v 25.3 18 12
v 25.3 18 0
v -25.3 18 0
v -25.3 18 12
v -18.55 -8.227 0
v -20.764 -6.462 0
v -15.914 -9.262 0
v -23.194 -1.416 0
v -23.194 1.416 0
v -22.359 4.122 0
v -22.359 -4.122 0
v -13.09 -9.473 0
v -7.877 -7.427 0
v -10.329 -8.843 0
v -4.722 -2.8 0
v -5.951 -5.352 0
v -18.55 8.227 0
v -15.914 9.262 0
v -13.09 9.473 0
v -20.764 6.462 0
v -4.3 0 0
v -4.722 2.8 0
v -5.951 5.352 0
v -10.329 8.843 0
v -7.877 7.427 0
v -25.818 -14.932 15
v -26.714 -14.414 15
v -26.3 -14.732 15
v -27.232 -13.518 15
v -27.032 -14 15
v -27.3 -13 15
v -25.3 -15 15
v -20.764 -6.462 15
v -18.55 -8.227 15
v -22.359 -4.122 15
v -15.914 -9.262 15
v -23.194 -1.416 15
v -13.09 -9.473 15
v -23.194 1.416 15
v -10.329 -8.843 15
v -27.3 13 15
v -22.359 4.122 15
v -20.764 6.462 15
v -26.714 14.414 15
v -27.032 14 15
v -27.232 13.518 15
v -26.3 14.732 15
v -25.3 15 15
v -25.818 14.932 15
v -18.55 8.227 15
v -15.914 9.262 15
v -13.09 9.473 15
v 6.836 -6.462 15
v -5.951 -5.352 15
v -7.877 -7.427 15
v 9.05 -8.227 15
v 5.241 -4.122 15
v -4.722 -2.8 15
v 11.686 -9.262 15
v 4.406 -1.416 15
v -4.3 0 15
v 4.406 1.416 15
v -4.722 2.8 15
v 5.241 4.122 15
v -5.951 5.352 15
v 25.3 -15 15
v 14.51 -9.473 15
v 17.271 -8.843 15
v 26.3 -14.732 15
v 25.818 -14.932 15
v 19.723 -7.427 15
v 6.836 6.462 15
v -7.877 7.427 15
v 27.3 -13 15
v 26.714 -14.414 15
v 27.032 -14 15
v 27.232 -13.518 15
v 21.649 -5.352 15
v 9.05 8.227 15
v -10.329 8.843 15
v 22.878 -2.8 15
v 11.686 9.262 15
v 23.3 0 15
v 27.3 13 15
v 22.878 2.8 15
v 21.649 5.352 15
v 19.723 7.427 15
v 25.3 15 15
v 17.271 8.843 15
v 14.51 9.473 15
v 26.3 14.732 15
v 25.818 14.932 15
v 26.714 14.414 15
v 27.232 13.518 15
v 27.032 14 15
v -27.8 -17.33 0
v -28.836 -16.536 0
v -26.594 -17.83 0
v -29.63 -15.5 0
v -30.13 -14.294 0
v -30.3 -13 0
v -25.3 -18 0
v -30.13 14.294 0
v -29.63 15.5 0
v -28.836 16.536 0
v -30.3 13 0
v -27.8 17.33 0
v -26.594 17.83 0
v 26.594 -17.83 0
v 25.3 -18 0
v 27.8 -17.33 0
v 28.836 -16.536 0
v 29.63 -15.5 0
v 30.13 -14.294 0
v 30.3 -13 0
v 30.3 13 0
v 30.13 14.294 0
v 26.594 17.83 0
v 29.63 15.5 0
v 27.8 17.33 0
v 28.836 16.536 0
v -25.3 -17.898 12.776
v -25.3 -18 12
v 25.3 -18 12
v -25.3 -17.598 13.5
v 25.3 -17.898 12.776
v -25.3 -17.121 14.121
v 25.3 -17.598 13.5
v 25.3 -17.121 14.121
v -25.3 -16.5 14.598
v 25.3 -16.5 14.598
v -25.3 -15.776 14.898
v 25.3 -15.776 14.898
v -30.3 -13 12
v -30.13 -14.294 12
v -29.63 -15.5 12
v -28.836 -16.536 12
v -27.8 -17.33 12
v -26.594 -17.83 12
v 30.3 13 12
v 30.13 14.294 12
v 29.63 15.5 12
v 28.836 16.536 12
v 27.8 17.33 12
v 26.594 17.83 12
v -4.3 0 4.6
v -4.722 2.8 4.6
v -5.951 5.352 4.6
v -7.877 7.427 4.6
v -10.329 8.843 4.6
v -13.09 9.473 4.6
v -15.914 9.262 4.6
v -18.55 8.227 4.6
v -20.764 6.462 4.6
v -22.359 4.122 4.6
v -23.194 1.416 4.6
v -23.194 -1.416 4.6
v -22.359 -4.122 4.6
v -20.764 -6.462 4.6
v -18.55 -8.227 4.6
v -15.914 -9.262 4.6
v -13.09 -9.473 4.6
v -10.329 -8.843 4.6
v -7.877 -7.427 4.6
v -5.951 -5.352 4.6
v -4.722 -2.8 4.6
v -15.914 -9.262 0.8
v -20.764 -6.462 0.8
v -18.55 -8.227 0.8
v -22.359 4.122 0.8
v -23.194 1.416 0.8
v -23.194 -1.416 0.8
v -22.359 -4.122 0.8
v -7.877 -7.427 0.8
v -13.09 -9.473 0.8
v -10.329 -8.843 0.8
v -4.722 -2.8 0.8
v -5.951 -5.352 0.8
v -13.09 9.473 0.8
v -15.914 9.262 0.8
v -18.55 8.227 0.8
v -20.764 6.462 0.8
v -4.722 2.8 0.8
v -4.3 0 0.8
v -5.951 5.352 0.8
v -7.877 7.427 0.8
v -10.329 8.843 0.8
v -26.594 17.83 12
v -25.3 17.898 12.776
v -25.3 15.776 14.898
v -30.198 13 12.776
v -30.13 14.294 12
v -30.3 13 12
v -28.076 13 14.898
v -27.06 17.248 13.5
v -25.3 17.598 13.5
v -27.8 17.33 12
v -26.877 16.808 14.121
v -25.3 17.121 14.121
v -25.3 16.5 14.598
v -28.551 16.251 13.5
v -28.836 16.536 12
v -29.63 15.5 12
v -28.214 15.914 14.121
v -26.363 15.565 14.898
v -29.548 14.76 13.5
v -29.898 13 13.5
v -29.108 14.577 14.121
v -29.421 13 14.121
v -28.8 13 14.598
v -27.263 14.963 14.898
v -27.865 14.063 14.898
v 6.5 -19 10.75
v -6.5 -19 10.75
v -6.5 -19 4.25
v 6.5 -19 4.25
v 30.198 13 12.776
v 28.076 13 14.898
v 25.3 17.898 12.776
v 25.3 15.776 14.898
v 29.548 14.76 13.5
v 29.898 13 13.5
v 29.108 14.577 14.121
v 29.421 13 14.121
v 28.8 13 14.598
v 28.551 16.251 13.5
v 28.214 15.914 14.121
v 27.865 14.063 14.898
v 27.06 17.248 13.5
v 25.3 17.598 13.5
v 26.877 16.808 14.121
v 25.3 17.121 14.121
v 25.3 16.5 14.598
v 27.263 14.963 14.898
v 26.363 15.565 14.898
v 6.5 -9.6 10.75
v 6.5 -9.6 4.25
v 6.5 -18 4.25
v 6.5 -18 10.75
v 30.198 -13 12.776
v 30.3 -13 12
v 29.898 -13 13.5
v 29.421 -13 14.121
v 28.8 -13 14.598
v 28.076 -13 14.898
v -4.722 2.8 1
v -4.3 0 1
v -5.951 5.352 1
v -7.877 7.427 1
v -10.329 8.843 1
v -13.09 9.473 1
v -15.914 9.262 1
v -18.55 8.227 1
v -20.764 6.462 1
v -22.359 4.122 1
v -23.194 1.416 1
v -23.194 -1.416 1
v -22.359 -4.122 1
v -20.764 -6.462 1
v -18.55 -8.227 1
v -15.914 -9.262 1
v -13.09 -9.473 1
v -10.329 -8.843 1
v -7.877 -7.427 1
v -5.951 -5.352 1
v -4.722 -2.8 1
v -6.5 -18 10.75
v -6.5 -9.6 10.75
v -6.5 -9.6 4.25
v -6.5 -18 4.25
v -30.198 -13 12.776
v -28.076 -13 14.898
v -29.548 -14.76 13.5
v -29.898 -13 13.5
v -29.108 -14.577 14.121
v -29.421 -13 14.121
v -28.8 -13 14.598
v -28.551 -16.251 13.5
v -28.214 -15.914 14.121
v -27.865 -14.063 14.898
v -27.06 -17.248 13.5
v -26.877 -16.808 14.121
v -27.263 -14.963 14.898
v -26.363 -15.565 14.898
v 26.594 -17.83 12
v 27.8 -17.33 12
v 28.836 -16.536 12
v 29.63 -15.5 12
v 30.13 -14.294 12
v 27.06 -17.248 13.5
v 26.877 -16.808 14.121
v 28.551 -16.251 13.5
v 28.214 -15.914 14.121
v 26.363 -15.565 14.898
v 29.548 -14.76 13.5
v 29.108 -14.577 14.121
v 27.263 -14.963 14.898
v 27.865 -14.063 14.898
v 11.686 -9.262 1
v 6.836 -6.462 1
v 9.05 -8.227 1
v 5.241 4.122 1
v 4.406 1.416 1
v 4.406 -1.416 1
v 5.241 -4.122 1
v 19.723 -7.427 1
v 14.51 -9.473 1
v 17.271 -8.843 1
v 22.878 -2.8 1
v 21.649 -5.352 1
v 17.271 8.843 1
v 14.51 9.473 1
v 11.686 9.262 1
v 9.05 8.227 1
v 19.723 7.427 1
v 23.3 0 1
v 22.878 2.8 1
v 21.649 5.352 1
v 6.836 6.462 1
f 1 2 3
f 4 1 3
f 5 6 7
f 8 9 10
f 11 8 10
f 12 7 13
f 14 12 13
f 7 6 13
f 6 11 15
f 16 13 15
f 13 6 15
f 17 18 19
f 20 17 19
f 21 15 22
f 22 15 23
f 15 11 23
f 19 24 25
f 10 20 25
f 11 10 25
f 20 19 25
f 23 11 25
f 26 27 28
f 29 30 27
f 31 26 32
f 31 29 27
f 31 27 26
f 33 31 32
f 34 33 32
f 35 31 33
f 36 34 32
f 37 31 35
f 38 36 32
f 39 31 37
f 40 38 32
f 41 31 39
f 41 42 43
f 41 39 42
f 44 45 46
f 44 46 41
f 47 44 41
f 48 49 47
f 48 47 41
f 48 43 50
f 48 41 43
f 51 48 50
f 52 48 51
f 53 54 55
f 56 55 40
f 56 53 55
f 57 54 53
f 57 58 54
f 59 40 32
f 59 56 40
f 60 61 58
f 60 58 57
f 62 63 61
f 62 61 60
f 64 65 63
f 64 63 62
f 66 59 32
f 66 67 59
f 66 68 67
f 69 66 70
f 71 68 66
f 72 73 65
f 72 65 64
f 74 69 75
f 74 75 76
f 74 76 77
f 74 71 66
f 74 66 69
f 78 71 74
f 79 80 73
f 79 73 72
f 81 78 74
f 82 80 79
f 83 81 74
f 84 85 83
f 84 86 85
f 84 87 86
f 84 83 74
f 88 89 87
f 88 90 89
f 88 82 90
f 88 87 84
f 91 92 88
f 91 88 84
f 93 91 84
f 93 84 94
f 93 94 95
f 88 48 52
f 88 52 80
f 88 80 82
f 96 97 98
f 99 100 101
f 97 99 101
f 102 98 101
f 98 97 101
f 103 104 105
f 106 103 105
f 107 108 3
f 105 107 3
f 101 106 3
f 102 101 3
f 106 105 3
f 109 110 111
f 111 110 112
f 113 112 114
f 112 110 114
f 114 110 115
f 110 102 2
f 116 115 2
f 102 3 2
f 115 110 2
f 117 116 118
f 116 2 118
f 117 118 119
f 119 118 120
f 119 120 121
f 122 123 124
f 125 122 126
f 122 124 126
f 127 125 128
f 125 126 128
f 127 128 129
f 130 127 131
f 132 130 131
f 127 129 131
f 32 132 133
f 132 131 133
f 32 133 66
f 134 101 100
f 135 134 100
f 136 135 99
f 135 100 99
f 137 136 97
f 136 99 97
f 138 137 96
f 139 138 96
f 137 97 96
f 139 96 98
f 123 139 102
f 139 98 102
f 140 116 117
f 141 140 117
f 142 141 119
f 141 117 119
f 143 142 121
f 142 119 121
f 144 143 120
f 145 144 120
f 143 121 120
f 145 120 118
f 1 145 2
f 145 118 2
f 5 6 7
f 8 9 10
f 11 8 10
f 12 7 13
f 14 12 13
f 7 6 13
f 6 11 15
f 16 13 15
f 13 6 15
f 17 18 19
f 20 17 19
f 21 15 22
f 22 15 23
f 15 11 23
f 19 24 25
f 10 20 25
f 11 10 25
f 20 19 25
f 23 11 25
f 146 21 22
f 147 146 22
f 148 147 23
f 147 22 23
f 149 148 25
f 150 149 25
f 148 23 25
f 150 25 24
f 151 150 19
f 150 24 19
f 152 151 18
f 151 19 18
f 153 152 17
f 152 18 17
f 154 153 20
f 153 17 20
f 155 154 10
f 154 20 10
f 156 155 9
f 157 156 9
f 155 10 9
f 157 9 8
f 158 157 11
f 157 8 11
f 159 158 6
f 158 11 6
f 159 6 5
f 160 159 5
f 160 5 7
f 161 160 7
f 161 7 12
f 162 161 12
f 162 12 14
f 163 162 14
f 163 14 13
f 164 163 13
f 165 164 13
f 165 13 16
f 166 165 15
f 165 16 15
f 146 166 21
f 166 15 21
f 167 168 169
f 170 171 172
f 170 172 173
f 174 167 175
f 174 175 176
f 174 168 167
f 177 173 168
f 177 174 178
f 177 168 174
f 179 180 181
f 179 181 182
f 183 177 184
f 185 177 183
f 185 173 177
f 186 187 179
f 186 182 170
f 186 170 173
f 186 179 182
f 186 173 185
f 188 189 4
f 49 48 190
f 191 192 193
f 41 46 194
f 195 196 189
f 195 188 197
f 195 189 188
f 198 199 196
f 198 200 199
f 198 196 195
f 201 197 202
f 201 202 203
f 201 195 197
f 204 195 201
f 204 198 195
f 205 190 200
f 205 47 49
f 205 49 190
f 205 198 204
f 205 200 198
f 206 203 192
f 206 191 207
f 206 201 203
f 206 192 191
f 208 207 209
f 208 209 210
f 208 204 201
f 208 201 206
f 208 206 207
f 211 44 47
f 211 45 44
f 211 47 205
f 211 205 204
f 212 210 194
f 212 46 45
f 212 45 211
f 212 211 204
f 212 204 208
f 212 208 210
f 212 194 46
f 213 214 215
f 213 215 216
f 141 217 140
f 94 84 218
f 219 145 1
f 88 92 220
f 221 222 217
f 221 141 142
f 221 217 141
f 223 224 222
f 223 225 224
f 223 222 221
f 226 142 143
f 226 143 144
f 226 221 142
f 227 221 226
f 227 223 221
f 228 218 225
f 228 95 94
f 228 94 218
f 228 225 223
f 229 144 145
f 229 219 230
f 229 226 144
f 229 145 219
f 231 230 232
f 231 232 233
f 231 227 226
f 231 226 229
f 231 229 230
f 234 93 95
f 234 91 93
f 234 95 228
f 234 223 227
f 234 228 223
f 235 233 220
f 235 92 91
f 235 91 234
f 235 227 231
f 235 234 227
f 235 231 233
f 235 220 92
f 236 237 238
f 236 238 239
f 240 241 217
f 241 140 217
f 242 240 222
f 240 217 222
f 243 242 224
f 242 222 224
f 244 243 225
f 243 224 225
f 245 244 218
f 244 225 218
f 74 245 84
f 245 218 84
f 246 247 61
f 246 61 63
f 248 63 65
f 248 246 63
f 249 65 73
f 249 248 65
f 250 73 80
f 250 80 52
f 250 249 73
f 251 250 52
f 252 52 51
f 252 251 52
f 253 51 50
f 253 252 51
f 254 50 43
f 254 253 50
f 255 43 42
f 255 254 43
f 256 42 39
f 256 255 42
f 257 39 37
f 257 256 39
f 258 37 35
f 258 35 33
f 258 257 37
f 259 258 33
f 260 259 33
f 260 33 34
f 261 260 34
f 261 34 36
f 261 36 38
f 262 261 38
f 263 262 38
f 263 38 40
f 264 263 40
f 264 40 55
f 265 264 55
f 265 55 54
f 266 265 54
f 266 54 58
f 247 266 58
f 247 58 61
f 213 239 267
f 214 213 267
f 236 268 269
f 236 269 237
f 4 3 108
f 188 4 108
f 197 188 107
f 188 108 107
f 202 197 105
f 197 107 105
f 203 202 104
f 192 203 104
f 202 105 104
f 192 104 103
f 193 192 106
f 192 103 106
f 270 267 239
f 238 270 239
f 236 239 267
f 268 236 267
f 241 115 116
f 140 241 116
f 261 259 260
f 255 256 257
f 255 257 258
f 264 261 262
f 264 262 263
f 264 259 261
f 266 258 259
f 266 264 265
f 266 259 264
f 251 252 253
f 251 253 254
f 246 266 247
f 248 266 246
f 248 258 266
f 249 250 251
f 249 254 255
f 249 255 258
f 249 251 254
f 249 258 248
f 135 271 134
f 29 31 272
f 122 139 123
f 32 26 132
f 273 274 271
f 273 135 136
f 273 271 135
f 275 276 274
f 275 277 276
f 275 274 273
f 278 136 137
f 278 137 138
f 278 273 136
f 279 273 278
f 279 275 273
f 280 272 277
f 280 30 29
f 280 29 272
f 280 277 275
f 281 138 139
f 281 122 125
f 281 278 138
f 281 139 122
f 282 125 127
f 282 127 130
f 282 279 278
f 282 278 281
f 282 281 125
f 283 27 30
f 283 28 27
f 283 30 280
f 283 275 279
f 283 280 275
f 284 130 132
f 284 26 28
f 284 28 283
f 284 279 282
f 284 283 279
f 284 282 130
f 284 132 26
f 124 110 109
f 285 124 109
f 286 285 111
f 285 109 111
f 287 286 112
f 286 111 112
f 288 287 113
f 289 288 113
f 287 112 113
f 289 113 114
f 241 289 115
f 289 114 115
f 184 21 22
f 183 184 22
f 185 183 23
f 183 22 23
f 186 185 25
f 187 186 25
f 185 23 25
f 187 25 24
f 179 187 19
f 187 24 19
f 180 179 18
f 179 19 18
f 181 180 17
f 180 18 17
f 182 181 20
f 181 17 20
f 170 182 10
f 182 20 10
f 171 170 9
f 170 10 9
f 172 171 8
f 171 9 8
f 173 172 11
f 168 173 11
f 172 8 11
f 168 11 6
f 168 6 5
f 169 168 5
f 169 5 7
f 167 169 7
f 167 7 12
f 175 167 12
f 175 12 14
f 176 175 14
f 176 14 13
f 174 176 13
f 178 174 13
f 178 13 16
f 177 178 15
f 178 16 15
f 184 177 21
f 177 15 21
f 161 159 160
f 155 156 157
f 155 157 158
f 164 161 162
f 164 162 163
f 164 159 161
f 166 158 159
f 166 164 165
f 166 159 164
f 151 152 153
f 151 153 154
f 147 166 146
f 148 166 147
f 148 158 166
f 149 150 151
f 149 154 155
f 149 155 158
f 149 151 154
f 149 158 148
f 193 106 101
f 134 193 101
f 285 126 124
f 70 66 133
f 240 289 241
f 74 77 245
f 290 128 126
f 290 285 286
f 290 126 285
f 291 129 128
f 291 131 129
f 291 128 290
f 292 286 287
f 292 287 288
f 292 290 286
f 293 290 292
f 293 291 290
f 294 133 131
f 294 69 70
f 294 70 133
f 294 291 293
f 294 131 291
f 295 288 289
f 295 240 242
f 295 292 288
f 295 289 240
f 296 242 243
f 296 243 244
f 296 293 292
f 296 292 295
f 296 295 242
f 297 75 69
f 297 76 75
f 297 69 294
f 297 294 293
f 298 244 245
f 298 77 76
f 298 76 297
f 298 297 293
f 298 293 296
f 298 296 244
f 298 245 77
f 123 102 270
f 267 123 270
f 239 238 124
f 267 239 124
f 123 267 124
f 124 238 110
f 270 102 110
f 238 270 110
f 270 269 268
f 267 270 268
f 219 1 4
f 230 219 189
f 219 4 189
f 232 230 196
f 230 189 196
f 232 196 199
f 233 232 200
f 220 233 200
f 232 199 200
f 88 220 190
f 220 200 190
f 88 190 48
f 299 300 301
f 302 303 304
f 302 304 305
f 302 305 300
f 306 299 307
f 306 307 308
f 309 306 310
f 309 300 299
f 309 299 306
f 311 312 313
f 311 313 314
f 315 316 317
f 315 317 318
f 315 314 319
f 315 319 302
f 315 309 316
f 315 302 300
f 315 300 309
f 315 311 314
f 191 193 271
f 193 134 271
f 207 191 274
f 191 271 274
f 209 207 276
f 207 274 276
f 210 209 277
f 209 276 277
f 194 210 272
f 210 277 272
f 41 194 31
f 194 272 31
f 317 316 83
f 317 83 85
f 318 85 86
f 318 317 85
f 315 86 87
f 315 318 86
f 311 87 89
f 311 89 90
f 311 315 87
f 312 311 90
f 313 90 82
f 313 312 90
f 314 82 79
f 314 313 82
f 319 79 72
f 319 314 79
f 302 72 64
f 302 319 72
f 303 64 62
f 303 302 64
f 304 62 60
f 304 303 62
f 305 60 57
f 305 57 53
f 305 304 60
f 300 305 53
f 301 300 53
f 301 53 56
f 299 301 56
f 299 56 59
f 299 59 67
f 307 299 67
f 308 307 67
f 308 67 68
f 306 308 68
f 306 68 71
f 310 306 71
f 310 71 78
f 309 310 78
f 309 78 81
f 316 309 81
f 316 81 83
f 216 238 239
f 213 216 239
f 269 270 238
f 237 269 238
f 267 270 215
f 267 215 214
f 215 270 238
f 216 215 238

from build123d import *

# Parameters (mm, degrees)
F0_R     = 9.5
F1_DEPTH = 15
F2_DEPTH = 1
F3_W     = 6.5
F3_H     = 6.5
F4_DEPTH = 8.4
F5_R     = 3
F6_DEPTH = 0.8
F7_DEPTH = 1
F8_DEPTH = 4.6


with BuildPart() as f1:
    # F0 (on Top) → F1 (new body)
    with BuildSketch(Plane.XY):
        with BuildLine():
            Line((25.3, 18), (-25.3, 18))
            ThreePointArc((-25.3, 18), (-28.8355339059, 16.5355339059), (-30.3, 13))
            Line((-30.3, 13), (-30.3, -13))
            ThreePointArc((-30.3, -13), (-28.8355339059, -16.5355339059), (-25.3, -18))
            Line((-25.3, -18), (25.3, -18))
            ThreePointArc((25.3, -18), (28.8355339059, -16.5355339059), (30.3, -13))
            Line((30.3, -13), (30.3, 13))
            ThreePointArc((30.3, 13), (28.8355339059, 16.5355339059), (25.3, 18))
        make_face()
        with BuildLine():
            ThreePointArc((-28.3, 11), (-26.8355339059, 14.5355339059), (-23.3, 16))
            Line((-23.3, 16), (23.3, 16))
            ThreePointArc((23.3, 16), (26.8355339059, 14.5355339059), (28.3, 11))
            Line((28.3, 11), (28.3, -11))
            ThreePointArc((28.3, -11), (26.8355339059, -14.5355339059), (23.3, -16))
            Line((23.3, -16), (-23.3, -16))
            ThreePointArc((-23.3, -16), (-26.8355339059, -14.5355339059), (-28.3, -11))
            Line((-28.3, -11), (-28.3, 11))
        make_face(mode=Mode.SUBTRACT)
        with BuildLine():
            Line((23.3, 16), (-23.3, 16))
            ThreePointArc((-23.3, 16), (-26.8355339059, 14.5355339059), (-28.3, 11))
            Line((-28.3, 11), (-28.3, -11))
            ThreePointArc((-28.3, -11), (-26.8355339059, -14.5355339059), (-23.3, -16))
            Line((-23.3, -16), (23.3, -16))
            ThreePointArc((23.3, -16), (26.8355339059, -14.5355339059), (28.3, -11))
            Line((28.3, -11), (28.3, 11))
            ThreePointArc((28.3, 11), (26.8355339059, 14.5355339059), (23.3, 16))
        make_face()
        with Locations((-13.8, 0)):
            Circle(F0_R, mode=Mode.SUBTRACT)
        with Locations((13.8, 0)):
            Circle(F0_R, mode=Mode.SUBTRACT)
    extrude(amount=F1_DEPTH)

    # F0 (on Top) → F2 (join)
    with BuildSketch(Plane.XY):
        with Locations((-13.8, 0)):
            Circle(F0_R)
        with Locations((13.8, 0)):
            Circle(F0_R)
    extrude(amount=F2_DEPTH)

    # F3 (on face) → F4 (cut)
    with BuildSketch(Plane.XZ.offset(18)):
        with Locations((-3.25, 7.5)):
            Rectangle(F3_W, F3_H)
        with Locations((3.25, 7.5)):
            Rectangle(F3_W, F3_H)
    extrude(amount=-F4_DEPTH, mode=Mode.SUBTRACT)

    # F5
    f5_edges = [f1.edges().sort_by_distance(p)[0] for p in [
        (0, -18, 15),
    ]]
    fillet(f5_edges, radius=F5_R)


with BuildPart() as f6:
    # F0 (on Top) → F6 (new body)
    with BuildSketch(Plane.XY):
        with Locations((-13.8, 0)):
            Circle(F0_R)
    extrude(amount=F6_DEPTH)


with BuildPart() as f7:
    # F3 (on face) → F7 (new body)
    with BuildSketch(Plane.XZ.offset(18)):
        with Locations((3.25, 7.5)):
            Rectangle(F3_W, F3_H)
        with Locations((-3.25, 7.5)):
            Rectangle(F3_W, F3_H)
    extrude(amount=F7_DEPTH)


with BuildPart() as f8:
    # F0 (on Top) → F8 (new body)
    with BuildSketch(Plane.XY):
        with Locations((-13.8, 0)):
            Circle(F0_R)
    extrude(amount=F8_DEPTH)


solid = Compound([f1.part, f6.part, f7.part, f8.part])
